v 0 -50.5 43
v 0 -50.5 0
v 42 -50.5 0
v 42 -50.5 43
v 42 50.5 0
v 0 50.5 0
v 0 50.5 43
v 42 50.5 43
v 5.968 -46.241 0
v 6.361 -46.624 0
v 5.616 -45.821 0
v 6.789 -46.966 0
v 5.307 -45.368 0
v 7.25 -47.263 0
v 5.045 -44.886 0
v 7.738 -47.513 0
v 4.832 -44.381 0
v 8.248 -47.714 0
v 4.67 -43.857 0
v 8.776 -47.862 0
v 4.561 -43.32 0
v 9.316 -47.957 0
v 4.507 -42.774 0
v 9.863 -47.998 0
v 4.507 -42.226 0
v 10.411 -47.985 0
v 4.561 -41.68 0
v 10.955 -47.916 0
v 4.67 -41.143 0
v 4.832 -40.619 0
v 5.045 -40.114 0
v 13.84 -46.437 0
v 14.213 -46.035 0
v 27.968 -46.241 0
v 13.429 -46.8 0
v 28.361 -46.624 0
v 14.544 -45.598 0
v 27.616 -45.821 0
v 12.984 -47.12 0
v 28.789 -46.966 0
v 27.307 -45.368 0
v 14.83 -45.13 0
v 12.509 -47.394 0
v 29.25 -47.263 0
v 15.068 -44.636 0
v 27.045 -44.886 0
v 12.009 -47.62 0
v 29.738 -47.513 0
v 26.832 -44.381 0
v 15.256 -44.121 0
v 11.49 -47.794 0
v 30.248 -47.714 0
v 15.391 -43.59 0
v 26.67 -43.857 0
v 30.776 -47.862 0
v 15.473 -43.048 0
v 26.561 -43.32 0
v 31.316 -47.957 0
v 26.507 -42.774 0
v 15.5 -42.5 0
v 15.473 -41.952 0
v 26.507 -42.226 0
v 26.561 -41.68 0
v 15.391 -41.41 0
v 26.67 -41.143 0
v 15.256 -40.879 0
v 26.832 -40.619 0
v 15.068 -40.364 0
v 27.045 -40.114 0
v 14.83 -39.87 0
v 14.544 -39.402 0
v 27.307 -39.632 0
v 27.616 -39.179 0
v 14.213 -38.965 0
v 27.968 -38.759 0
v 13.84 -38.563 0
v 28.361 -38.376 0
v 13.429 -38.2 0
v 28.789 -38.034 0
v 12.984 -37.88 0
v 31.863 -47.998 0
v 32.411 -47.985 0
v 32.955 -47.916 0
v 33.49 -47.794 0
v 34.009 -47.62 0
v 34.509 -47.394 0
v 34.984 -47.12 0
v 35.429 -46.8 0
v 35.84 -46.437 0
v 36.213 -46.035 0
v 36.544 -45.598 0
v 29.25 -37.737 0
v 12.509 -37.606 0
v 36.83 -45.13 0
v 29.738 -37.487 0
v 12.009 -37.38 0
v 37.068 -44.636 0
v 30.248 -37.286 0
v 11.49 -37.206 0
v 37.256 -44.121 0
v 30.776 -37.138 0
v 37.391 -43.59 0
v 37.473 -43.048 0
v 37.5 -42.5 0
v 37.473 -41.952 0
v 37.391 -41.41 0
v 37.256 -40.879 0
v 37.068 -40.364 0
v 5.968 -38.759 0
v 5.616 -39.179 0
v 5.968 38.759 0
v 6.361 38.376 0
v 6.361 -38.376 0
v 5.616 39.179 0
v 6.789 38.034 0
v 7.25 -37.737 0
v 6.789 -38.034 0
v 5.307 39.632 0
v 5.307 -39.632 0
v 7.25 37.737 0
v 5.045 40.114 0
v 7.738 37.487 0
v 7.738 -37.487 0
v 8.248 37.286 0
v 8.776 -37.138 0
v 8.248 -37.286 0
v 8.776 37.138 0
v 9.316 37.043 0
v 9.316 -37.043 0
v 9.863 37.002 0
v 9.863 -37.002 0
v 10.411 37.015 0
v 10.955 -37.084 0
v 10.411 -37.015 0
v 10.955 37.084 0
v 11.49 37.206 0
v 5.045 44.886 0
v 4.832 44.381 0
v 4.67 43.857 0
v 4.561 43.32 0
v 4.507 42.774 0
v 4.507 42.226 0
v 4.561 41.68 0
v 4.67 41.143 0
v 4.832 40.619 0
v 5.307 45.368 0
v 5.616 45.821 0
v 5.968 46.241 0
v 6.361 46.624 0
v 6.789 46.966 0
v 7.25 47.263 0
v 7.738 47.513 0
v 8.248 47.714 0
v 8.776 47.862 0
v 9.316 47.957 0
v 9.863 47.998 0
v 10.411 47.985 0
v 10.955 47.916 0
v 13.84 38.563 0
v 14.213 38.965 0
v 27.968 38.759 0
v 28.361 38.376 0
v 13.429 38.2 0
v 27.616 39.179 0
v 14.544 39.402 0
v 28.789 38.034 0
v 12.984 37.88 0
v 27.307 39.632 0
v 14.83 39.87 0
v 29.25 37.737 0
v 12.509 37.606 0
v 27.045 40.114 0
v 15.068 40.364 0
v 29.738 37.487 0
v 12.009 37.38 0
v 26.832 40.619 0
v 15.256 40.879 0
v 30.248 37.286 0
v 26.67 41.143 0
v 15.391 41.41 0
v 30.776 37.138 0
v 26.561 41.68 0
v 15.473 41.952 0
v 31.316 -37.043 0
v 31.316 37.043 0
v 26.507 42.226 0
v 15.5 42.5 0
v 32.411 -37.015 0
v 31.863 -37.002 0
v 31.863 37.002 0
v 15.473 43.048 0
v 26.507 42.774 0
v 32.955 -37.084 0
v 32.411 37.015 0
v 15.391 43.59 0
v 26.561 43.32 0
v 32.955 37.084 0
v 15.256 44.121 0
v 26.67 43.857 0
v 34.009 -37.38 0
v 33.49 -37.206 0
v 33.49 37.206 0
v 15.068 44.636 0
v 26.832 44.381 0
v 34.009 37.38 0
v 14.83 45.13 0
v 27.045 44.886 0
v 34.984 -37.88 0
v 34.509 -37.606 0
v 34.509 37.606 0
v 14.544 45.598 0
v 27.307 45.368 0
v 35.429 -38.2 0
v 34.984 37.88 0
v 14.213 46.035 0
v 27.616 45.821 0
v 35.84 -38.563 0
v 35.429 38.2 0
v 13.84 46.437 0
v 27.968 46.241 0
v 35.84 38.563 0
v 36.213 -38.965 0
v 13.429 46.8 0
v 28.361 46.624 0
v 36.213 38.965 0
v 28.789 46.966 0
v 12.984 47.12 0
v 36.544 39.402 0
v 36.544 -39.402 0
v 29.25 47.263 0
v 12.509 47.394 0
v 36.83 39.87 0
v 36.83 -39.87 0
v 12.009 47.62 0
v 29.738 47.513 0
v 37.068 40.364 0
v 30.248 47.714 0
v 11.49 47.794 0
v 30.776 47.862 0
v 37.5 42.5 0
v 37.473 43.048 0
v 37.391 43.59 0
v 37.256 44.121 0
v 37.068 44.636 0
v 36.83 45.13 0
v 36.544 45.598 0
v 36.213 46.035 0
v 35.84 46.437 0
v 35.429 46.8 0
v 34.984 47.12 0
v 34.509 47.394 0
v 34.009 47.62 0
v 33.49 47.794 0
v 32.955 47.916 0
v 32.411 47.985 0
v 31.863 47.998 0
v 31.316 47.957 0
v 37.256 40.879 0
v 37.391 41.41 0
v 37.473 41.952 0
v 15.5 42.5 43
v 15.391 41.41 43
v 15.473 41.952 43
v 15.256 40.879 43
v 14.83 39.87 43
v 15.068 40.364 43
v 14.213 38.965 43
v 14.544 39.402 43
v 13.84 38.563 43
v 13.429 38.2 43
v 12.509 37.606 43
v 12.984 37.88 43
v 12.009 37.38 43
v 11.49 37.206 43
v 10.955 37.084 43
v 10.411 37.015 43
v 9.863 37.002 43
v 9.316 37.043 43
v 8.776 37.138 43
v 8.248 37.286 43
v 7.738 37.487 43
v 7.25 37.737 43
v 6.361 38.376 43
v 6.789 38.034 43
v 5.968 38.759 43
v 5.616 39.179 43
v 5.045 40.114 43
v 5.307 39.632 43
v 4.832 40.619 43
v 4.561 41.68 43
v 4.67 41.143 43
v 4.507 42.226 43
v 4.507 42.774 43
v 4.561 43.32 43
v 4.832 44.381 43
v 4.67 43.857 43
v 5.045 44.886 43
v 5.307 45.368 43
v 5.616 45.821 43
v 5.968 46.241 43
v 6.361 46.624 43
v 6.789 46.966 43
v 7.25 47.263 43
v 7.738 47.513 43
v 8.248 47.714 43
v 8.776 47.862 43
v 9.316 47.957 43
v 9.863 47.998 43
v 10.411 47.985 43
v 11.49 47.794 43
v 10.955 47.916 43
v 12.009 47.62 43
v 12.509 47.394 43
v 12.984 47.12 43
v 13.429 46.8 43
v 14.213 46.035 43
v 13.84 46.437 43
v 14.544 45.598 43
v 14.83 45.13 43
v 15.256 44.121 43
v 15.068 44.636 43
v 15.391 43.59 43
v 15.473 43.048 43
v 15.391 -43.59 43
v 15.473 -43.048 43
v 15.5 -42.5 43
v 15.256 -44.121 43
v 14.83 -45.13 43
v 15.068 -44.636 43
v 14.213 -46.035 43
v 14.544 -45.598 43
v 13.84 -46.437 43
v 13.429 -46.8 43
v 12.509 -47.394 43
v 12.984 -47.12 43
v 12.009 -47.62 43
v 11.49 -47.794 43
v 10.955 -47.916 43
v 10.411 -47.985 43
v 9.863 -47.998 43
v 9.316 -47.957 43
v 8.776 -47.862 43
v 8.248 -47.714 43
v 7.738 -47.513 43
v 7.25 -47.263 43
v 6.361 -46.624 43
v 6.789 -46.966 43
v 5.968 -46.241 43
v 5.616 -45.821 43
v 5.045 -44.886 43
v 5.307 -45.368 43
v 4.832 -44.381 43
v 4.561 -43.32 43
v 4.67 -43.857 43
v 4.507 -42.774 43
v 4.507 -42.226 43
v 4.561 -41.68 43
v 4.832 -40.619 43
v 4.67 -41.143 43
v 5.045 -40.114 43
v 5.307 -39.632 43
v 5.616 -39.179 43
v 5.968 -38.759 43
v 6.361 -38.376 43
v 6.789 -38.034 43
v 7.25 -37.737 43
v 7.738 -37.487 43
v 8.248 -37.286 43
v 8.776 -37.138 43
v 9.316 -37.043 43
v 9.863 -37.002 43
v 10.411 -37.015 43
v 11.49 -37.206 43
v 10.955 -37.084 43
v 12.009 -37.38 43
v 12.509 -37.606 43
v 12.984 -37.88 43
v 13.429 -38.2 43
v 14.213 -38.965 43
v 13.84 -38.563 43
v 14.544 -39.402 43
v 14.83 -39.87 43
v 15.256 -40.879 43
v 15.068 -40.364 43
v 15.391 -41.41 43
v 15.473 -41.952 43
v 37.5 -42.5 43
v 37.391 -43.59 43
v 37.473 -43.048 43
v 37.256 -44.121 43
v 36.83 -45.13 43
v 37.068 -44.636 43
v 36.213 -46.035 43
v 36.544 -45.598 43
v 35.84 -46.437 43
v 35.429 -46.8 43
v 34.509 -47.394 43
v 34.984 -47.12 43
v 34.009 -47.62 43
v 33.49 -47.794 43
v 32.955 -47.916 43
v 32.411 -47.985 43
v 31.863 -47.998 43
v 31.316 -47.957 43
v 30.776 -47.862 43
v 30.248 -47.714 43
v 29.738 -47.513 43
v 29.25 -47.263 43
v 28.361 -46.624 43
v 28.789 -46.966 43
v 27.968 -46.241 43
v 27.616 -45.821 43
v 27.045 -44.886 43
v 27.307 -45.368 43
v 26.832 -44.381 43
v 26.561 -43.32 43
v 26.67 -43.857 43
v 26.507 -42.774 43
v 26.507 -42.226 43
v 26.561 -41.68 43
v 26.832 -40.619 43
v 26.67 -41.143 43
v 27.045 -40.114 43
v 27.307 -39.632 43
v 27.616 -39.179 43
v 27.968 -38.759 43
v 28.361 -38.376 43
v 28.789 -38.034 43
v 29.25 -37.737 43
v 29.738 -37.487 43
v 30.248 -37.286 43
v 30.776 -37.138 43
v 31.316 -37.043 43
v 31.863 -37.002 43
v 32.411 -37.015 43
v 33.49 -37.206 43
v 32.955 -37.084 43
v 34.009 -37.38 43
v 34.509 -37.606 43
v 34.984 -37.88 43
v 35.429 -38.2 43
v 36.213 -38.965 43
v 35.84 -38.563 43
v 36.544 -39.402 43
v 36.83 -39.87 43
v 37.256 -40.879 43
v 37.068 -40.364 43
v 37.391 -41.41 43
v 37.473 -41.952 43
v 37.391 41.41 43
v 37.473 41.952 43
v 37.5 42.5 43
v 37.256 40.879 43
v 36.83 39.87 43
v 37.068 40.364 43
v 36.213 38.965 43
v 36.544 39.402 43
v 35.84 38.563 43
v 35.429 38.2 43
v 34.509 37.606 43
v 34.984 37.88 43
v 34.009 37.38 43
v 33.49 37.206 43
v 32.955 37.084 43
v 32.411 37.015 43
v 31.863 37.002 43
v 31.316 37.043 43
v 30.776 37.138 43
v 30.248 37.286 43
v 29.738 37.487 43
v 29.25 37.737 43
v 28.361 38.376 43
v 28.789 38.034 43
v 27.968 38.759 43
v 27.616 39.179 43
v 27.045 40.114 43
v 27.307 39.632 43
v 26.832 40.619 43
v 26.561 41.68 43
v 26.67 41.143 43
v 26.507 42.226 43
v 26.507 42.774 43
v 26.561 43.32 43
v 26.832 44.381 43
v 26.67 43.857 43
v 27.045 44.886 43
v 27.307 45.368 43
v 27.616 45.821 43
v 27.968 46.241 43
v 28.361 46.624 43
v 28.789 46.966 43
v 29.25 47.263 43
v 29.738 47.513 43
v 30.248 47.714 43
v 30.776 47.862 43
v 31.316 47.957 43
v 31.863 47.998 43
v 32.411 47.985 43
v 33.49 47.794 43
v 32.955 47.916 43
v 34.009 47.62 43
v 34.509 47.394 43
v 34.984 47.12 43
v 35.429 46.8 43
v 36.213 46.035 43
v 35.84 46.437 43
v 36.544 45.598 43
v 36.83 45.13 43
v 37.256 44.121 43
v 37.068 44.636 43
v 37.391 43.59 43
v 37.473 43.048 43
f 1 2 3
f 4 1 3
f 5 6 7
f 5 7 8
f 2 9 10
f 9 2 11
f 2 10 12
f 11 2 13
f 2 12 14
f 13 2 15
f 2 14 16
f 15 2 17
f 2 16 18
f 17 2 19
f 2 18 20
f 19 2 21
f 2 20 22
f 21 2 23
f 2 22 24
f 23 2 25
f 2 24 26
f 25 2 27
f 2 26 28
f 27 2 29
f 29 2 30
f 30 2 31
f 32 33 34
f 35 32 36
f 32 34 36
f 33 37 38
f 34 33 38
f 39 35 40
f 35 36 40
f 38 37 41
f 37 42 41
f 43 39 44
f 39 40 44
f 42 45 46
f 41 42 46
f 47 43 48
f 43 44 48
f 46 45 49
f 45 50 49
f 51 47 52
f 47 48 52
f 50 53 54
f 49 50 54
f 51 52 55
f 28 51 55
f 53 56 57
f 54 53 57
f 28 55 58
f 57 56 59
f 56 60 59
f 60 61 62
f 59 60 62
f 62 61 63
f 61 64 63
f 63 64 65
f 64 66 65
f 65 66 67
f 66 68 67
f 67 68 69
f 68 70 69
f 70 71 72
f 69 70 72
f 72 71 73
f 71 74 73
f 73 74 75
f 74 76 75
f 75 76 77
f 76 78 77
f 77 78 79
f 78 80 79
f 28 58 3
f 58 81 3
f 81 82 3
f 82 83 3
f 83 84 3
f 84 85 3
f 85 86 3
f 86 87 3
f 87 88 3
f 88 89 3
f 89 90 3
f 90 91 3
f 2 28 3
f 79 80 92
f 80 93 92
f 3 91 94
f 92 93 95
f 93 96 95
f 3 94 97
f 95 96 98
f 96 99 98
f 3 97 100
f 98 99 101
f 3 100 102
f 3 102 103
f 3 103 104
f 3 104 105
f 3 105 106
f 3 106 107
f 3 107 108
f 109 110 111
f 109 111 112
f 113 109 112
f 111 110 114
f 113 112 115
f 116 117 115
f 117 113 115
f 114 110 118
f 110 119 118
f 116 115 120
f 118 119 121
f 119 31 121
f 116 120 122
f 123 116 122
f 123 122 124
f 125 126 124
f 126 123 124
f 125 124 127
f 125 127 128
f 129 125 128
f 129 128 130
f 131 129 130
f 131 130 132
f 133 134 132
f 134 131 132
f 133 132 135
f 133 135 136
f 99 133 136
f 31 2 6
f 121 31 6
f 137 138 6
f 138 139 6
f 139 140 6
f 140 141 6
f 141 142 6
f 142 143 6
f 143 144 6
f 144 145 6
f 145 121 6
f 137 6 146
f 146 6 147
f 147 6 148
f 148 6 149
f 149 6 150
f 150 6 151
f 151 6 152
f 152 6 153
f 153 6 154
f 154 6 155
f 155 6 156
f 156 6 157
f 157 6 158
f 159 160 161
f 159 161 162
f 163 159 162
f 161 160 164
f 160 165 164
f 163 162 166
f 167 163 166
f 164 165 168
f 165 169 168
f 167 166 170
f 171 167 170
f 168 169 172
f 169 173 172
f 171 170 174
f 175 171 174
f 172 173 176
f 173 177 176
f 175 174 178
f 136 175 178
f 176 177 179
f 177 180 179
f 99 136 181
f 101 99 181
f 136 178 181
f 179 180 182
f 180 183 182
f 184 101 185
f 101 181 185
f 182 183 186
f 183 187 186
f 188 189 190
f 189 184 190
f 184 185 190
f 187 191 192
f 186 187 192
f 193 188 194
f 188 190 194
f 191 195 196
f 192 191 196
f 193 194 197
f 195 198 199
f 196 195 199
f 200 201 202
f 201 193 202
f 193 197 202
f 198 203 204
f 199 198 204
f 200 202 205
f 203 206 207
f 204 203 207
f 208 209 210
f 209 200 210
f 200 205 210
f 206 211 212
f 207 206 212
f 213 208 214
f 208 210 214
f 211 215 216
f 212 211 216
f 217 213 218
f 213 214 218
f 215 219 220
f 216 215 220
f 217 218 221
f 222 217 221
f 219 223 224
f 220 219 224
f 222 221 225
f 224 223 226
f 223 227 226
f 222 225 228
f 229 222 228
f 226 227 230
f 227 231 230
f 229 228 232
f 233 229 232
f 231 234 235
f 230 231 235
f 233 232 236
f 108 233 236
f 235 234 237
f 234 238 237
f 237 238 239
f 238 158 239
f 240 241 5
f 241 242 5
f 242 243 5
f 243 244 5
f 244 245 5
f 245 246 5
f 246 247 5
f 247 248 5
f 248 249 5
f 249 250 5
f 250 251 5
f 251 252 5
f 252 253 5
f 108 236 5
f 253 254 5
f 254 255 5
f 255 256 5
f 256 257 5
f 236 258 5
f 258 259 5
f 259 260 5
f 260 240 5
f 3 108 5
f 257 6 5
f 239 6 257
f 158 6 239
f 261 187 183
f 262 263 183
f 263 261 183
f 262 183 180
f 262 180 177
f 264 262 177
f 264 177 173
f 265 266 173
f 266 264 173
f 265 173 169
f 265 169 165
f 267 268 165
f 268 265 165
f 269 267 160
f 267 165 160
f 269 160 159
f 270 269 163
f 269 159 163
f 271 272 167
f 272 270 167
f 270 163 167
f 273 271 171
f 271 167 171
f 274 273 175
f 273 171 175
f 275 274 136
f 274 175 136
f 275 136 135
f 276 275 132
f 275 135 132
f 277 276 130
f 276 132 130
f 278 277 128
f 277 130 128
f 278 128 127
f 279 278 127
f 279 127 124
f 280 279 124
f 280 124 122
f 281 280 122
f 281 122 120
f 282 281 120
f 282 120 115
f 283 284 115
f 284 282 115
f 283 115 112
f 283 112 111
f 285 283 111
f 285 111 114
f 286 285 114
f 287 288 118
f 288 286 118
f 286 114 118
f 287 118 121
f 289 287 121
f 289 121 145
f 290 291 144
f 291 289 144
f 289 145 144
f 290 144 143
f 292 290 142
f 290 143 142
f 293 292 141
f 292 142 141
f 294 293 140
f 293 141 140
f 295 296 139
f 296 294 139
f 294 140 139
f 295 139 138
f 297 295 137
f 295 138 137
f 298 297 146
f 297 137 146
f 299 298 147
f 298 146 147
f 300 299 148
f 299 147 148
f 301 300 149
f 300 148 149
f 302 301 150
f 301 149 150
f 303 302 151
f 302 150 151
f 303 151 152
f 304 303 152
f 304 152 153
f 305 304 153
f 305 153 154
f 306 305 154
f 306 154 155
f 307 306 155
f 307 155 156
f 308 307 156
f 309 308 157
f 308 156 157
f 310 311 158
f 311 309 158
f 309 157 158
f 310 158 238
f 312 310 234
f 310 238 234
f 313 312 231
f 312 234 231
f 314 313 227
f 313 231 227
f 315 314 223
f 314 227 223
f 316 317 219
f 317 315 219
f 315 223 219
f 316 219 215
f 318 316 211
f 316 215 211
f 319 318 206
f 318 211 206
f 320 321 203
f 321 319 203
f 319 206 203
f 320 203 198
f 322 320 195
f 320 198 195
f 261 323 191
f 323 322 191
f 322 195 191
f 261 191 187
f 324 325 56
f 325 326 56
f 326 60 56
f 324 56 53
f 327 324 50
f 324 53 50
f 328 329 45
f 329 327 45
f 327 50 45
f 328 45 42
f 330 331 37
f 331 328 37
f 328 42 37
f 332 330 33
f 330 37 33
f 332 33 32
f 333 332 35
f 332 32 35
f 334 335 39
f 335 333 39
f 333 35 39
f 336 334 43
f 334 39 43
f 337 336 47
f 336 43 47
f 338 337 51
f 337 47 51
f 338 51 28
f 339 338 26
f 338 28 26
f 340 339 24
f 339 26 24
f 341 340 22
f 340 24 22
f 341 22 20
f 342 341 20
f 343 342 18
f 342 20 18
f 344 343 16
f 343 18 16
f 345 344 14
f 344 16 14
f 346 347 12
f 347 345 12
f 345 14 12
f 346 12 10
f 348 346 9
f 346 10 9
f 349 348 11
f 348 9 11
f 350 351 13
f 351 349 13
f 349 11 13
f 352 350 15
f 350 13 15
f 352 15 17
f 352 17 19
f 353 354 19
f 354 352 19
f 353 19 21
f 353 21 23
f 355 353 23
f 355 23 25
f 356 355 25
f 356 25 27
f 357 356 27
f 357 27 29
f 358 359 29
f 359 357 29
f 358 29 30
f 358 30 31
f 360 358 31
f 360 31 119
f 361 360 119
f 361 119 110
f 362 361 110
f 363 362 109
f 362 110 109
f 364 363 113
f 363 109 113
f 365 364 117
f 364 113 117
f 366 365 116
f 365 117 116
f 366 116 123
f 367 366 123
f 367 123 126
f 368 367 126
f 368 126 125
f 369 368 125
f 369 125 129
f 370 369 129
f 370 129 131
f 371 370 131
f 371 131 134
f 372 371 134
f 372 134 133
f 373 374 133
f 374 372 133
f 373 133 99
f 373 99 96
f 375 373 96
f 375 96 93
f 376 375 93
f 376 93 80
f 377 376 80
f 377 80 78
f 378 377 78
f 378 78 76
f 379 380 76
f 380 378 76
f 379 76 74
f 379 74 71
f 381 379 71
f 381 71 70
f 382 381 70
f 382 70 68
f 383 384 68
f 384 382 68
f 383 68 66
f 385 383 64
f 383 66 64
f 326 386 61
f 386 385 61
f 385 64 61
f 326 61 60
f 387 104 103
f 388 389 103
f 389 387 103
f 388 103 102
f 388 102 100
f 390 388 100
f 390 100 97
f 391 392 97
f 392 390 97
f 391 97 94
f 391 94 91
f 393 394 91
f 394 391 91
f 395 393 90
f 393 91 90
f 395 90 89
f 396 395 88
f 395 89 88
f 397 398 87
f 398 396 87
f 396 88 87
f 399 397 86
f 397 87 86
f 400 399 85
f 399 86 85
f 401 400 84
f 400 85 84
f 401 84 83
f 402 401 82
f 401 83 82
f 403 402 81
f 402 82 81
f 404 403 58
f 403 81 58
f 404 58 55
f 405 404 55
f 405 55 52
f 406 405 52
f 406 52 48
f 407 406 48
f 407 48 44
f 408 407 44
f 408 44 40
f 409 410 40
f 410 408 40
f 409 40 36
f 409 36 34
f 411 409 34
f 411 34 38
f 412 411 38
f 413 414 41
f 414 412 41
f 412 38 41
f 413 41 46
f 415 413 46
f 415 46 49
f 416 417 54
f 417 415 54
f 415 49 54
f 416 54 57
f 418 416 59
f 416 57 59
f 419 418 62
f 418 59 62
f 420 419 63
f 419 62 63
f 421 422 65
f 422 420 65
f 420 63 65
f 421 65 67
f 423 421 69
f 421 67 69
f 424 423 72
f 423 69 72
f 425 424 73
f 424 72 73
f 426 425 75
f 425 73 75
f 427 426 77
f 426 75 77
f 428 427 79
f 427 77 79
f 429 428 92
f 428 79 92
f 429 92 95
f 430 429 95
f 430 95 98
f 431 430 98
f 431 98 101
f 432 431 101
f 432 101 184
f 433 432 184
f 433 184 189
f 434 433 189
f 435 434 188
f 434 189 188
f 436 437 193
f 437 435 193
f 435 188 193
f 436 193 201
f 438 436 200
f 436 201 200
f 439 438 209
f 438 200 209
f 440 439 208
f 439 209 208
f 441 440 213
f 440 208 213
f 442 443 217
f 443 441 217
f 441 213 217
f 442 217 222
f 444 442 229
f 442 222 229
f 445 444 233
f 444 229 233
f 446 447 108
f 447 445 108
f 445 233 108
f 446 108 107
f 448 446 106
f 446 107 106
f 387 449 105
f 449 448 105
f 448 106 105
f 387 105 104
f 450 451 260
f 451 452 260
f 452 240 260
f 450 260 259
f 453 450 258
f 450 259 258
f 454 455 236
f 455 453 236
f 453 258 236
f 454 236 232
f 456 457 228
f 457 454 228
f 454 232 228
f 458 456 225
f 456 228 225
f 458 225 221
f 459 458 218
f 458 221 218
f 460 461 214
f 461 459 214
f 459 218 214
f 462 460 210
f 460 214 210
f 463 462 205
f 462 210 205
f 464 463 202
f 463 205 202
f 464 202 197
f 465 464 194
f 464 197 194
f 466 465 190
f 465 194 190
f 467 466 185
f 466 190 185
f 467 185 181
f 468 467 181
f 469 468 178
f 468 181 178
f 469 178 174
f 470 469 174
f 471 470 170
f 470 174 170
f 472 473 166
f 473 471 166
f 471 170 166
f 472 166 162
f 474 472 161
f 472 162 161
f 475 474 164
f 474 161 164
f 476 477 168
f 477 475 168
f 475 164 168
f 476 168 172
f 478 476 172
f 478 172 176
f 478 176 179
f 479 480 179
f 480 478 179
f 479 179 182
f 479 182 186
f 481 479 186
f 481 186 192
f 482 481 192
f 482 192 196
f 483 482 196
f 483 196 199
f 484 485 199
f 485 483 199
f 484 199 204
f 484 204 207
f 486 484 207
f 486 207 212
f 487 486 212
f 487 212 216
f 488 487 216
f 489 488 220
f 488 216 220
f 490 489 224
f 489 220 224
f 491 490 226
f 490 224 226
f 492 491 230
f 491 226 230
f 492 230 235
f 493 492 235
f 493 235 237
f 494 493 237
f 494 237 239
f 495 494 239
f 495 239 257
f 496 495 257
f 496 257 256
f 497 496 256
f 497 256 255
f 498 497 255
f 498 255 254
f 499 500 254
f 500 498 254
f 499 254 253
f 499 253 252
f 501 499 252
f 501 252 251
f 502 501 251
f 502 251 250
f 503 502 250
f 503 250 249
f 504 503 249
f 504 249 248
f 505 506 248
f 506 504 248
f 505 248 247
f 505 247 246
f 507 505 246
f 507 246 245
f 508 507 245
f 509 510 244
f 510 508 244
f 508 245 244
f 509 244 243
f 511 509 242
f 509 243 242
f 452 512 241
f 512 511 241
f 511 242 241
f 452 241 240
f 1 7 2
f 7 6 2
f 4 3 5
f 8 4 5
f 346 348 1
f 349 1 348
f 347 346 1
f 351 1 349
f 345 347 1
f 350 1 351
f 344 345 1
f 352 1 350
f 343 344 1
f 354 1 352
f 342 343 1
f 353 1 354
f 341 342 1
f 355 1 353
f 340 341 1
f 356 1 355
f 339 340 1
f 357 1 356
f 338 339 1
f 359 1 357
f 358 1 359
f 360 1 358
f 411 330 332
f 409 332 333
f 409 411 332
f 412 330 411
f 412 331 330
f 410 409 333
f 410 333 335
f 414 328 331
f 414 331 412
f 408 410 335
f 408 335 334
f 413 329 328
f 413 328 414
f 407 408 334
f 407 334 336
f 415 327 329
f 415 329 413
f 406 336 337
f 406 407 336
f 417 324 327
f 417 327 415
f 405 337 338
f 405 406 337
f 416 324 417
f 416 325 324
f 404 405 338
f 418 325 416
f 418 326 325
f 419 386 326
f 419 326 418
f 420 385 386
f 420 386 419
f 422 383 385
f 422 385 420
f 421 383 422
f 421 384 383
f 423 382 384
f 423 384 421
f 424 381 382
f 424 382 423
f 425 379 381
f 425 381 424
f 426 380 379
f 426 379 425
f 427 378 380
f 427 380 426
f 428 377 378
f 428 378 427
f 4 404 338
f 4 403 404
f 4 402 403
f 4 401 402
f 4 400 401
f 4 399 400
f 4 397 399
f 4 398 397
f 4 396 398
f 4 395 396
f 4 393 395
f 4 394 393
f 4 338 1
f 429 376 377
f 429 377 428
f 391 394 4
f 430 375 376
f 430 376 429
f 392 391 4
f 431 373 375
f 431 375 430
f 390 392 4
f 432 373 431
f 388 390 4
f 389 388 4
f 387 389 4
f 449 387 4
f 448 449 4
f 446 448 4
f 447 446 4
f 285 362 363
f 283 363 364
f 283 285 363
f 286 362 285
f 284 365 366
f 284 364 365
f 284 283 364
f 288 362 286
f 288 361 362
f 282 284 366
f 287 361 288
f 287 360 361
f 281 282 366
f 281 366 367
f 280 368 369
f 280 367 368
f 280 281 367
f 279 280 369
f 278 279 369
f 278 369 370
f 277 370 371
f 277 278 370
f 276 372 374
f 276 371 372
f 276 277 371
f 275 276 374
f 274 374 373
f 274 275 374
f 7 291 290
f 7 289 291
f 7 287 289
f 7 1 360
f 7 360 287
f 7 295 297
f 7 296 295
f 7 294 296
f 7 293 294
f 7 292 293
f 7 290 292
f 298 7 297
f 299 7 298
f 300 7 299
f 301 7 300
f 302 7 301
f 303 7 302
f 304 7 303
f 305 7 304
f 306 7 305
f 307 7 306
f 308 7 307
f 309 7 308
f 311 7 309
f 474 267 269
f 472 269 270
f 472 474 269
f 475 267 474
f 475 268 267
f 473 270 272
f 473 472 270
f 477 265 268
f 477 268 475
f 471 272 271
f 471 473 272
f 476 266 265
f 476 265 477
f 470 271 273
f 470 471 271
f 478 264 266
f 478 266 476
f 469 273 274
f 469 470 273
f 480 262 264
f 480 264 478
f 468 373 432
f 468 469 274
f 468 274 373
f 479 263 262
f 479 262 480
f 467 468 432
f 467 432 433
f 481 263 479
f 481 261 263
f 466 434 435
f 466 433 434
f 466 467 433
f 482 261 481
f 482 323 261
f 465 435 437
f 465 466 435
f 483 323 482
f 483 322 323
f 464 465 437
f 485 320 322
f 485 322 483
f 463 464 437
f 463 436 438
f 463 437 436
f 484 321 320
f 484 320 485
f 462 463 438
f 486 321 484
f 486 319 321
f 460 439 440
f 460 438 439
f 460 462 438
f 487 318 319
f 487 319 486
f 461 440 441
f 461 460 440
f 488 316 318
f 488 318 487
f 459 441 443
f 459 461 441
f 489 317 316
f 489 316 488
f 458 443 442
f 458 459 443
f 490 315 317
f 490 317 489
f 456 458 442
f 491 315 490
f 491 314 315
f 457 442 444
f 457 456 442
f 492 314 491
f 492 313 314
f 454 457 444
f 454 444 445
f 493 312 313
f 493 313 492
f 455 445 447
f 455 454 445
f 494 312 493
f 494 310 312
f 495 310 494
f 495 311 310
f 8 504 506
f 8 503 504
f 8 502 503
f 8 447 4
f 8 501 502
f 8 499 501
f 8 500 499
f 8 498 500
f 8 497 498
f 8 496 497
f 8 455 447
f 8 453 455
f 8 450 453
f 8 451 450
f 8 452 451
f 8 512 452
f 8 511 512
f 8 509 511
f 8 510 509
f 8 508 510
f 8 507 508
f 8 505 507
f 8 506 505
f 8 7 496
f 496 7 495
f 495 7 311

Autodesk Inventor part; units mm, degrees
ref_plane "YZ Plane" through (0, 0, 0) normal (1, 0, 0) x (0, 1, 0)
ref_plane "XZ Plane" through (0, 0, 0) normal (0, 1, 0) x (-1, 0, 0)
ref_plane "XY Plane" through (0, 0, 0) normal (0, 0, 1) x (1, 0, 0)
sketch "Sketch1" plane through (0, 0, 0) normal (0, 0, 1) x (1, 0, 0)
  circle A0 centre (10, -42.5) radius 5.5 projected
  circle A1 centre (10, 42.5) radius 5.5 projected
  circle A2 centre (32, -42.5) radius 5.5 projected
  circle A3 centre (32, 42.5) radius 5.5 projected
  line L0 (42, -50.5) -> (42, 50.5) projected
  line L1 (0, 50.5) -> (42, 50.5) projected
  line L2 (0, 50.5) -> (0, -50.5) projected
  line L3 (0, -50.5) -> (42, -50.5) projected
  point P0 (0, 0)
extrude "Extrusion1" add sketch "Sketch1" along normal blind 43
properties part number "BaseBallScrewSupport"
